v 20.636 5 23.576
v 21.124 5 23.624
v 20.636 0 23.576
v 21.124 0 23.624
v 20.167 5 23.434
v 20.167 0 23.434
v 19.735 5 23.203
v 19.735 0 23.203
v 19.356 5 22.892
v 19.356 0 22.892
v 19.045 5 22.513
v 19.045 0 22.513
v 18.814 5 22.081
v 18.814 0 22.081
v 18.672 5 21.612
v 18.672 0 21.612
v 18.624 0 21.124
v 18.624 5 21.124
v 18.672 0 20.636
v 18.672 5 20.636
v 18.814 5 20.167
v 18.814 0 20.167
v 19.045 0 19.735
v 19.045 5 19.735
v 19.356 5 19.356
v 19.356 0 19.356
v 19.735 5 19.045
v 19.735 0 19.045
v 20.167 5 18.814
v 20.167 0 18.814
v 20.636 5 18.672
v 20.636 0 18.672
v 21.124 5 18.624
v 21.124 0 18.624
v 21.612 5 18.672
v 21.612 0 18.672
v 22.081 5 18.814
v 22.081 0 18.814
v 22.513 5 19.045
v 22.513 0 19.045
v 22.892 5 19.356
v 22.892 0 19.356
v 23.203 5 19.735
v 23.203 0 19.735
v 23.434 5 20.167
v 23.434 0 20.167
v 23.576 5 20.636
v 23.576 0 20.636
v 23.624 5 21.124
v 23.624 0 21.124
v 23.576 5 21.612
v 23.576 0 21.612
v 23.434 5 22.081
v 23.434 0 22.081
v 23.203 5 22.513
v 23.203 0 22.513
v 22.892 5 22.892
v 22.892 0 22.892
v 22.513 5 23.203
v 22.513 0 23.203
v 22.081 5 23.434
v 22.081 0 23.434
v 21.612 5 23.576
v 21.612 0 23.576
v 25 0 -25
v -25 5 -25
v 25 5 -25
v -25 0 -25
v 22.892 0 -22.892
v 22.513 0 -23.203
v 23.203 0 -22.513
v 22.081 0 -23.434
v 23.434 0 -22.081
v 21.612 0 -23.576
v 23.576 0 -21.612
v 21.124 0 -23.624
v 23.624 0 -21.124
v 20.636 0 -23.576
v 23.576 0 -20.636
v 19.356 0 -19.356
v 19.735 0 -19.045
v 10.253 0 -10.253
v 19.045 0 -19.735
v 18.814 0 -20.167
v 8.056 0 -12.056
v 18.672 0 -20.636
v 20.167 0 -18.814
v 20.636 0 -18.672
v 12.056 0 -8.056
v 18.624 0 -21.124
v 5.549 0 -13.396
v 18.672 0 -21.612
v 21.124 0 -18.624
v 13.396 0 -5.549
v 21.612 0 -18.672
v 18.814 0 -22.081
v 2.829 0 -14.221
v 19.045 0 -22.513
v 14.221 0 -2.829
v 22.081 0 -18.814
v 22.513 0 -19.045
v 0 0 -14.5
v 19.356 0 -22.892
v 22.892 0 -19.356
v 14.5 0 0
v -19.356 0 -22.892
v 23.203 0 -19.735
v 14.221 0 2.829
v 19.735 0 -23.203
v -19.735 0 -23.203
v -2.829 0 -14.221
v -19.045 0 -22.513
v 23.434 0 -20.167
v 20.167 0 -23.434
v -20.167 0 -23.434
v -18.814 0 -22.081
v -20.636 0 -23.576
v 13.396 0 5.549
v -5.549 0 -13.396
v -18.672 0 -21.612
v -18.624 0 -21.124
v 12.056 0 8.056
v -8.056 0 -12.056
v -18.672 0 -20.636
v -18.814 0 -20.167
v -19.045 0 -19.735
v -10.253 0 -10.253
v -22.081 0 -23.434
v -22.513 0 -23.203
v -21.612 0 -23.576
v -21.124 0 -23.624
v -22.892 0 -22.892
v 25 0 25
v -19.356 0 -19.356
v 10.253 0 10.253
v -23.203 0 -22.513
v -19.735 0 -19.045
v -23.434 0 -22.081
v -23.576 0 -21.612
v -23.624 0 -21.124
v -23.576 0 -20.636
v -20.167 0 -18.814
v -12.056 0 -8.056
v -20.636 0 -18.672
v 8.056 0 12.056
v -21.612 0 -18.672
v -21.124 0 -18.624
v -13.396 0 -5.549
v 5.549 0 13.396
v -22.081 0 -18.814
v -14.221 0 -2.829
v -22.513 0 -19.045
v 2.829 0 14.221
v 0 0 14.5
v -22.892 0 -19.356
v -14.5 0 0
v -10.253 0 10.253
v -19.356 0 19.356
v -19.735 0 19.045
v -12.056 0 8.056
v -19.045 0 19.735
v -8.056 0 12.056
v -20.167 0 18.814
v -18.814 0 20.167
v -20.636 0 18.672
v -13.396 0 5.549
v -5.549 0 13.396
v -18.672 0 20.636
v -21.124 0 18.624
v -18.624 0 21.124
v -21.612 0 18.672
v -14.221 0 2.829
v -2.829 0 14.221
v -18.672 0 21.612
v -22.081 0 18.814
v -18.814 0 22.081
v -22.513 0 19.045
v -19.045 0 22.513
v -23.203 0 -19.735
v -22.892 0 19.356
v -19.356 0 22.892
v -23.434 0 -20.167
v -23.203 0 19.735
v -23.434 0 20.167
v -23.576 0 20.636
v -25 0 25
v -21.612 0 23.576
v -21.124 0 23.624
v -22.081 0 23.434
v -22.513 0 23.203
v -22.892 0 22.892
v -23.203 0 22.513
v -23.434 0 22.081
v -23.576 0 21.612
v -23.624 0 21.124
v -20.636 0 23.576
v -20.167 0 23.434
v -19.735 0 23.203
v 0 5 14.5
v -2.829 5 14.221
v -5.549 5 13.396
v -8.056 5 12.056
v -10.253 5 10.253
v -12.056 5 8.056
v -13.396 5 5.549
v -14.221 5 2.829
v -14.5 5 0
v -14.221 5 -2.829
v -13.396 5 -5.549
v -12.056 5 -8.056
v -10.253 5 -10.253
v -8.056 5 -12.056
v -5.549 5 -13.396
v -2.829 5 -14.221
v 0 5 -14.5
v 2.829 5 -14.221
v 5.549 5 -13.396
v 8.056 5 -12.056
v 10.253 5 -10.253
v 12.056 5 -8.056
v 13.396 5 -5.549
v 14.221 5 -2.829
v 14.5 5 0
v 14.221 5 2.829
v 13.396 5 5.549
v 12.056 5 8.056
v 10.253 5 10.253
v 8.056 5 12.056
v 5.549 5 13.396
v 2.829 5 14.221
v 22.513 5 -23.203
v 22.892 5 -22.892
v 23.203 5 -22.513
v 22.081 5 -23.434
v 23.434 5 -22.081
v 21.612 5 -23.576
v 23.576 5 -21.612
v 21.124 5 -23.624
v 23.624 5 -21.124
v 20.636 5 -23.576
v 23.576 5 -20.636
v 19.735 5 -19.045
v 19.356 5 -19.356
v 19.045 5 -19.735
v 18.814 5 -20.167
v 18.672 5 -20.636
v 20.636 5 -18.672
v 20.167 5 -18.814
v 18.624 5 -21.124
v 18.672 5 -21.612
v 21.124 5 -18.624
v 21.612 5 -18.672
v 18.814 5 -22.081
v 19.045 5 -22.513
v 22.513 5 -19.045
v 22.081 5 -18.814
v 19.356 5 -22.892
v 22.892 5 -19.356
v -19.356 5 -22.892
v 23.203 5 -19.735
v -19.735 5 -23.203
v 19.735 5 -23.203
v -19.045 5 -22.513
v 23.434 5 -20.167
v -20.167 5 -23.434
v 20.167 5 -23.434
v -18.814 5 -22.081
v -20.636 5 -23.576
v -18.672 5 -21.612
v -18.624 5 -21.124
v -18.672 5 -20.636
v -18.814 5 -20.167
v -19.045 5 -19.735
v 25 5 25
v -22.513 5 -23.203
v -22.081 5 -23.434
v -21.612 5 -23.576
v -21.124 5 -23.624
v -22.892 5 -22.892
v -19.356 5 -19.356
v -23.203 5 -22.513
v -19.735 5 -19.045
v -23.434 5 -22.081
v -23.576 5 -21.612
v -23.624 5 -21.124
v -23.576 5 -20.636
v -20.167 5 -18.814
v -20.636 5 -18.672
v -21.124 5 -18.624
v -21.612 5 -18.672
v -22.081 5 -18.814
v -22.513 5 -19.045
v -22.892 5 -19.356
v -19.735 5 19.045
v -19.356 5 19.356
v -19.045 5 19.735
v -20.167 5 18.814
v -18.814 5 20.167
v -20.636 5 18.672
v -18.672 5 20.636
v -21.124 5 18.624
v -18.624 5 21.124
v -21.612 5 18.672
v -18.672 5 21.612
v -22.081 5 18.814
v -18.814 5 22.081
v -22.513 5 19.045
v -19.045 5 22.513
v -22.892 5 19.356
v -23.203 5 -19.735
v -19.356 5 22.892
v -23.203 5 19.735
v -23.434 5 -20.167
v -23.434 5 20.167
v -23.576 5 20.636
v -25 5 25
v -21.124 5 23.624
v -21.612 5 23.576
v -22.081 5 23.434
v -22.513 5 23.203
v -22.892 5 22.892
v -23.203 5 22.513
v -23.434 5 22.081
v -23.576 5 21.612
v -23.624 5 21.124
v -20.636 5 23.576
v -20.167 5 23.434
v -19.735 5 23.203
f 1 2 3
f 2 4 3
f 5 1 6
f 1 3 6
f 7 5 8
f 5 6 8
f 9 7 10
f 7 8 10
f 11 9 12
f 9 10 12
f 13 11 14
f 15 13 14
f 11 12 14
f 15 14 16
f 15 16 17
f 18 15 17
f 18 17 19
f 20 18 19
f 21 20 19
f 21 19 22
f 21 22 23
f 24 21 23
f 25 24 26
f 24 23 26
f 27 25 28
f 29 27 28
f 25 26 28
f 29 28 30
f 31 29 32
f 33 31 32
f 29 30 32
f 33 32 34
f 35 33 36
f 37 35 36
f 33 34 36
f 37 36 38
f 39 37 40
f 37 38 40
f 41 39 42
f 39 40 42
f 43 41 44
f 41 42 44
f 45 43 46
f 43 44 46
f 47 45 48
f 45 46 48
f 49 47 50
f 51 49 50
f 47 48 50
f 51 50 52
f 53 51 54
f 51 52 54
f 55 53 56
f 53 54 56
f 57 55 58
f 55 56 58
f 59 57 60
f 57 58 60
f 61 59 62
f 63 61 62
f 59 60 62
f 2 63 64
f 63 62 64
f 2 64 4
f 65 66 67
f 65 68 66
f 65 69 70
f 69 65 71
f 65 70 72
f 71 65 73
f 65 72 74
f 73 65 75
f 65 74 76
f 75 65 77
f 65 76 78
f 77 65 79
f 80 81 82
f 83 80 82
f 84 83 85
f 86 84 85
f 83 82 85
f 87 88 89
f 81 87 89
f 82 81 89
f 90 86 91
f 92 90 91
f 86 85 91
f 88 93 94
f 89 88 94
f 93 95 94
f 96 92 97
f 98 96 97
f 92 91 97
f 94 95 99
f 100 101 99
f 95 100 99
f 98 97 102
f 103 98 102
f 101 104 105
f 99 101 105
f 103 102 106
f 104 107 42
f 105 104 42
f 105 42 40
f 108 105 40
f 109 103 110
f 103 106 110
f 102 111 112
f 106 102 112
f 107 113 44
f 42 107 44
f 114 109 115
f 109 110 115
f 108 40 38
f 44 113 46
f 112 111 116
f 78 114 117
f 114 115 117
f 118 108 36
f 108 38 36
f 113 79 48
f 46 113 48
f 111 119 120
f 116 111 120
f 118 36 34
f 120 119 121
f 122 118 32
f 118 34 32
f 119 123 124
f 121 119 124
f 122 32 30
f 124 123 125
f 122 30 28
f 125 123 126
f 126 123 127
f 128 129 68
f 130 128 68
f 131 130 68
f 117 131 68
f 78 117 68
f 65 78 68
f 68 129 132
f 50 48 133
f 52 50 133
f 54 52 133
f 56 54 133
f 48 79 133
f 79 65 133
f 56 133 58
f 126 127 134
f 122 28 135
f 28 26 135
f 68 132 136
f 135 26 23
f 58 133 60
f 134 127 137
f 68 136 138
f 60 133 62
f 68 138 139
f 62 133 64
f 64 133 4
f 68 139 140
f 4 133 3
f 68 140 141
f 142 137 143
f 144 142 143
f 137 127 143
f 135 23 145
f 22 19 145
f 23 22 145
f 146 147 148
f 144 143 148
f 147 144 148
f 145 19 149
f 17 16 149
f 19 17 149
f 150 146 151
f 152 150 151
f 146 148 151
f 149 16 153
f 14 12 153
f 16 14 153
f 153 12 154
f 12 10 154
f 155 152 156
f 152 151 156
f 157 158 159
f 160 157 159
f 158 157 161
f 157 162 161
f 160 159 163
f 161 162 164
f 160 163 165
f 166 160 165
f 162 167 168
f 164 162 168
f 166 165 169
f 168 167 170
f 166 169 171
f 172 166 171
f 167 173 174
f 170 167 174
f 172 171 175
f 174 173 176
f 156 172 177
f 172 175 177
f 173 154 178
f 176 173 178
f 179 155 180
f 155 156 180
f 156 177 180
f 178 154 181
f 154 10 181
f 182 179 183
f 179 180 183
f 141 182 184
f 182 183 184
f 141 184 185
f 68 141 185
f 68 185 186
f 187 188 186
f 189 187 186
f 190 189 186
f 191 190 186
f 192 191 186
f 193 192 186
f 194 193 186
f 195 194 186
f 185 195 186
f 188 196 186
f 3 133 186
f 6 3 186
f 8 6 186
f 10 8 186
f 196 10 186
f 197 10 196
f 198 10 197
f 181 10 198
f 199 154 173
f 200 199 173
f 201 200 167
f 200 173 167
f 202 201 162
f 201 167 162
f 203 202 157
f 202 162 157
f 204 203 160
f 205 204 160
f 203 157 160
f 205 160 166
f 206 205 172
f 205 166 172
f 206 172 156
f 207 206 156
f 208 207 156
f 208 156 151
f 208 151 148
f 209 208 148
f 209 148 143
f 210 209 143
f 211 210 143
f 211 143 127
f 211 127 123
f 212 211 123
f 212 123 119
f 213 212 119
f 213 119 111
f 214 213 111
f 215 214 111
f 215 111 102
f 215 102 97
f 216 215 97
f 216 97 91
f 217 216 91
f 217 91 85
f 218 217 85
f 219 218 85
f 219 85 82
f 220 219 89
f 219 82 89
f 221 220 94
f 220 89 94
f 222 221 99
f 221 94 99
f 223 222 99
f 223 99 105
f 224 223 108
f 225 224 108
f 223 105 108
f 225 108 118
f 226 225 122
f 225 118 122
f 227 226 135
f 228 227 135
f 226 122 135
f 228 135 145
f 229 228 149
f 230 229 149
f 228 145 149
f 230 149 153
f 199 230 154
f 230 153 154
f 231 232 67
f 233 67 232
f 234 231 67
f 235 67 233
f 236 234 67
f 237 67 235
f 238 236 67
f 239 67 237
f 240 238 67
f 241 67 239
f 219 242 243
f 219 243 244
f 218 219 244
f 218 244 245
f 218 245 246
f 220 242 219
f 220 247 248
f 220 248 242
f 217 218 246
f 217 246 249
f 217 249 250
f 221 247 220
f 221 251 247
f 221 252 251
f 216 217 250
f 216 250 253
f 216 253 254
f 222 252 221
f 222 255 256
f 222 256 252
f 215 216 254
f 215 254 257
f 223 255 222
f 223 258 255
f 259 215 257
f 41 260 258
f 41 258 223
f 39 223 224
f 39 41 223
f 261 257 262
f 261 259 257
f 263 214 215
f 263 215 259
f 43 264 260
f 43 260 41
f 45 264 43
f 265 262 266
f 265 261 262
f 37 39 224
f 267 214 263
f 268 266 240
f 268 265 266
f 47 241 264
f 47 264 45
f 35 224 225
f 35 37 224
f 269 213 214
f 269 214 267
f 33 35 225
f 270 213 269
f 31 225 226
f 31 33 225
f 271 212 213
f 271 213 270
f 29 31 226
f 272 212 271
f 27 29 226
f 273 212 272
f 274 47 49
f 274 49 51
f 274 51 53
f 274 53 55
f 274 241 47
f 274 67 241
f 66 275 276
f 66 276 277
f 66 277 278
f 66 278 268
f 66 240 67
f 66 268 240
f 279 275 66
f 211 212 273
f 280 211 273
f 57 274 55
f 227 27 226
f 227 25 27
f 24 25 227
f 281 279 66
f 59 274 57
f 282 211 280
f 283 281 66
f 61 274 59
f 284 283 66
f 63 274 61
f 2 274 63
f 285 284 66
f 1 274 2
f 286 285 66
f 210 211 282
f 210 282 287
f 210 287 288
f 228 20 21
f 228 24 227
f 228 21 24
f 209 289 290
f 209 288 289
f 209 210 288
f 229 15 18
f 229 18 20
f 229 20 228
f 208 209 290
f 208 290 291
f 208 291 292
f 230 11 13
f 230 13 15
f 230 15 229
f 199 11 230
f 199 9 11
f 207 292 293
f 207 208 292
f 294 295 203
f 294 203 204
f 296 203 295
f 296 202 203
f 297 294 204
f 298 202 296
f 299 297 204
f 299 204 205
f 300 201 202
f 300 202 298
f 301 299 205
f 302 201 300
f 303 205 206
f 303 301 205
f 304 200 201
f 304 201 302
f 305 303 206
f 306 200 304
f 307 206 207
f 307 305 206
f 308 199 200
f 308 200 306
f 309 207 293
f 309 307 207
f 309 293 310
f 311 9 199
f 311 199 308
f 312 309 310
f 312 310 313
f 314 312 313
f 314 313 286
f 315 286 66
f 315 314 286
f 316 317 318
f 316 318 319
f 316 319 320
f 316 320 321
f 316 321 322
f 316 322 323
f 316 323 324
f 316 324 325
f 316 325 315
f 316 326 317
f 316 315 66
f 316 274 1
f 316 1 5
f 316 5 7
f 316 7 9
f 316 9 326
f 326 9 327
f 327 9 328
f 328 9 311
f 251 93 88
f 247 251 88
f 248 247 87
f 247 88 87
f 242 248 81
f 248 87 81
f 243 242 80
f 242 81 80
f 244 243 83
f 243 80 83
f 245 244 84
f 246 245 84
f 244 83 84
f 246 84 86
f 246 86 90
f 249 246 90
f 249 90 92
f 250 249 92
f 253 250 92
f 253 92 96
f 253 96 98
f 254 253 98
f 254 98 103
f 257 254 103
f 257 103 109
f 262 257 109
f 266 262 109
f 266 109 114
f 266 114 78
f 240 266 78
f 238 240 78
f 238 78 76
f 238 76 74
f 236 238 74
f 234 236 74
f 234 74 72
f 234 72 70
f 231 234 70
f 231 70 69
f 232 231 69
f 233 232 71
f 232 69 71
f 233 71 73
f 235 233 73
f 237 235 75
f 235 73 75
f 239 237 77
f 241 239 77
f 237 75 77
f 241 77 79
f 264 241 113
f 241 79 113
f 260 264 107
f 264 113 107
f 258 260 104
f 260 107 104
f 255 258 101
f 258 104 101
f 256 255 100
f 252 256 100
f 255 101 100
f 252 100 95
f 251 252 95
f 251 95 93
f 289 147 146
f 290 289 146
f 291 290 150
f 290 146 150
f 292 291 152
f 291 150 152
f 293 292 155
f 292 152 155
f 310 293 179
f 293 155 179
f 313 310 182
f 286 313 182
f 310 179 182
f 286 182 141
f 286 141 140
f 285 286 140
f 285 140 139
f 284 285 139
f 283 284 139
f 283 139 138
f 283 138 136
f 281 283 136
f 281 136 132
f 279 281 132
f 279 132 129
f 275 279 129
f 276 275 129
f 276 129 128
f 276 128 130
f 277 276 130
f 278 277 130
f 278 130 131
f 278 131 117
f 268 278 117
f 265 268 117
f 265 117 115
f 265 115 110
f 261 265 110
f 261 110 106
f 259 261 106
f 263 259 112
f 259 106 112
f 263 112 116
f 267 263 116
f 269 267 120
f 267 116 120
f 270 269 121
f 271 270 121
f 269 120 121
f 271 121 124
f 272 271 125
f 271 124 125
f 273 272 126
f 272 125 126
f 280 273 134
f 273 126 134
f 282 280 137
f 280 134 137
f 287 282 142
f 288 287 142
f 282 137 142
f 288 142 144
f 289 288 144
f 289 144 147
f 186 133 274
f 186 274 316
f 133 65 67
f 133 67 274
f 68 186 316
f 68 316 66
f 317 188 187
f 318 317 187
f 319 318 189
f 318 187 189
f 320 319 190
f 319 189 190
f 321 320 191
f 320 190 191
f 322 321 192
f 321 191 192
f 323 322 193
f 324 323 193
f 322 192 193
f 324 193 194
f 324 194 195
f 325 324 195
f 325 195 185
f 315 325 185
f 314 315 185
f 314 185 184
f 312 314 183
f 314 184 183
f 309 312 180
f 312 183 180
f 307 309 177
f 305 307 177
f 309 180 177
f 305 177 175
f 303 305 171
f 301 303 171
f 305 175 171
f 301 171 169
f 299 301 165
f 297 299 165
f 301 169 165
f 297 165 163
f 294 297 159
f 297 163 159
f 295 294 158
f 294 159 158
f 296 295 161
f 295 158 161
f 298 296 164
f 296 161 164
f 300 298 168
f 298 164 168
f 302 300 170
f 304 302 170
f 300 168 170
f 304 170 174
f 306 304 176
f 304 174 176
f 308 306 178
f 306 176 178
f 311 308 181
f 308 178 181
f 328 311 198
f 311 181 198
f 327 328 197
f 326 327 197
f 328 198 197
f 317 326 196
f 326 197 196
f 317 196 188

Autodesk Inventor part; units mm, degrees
ref_plane "YZ Plane" through (0, 0, 0) normal (1, 0, 0) x (0, 1, 0)
ref_plane "XZ Plane" through (0, 0, 0) normal (0, 1, 0) x (-1, 0, 0)
ref_plane "XY Plane" through (0, 0, 0) normal (0, 0, 1) x (1, 0, 0)
sketch "Skizze1" plane through (0, 0, 0) normal (0, 1, 0) x (-1, 0, 0)
  line L0 (-25, 25) -> (25, 25)
  line L1 (25, 25) -> (25, -25)
  line L2 (25, -25) -> (-25, -25)
  line L3 (-25, -25) -> (-25, 25)
  line L4 (-25, 25) -> (25, -25) construction
  line L5 (25, 25) -> (-25, -25) construction
  point P0 (0, 0)
  dimension "d0" = 50
  dimension "d1" = 50
extrude "Extrusion1" add sketch "Skizze1" along normal blind 5
sketch "Skizze2" plane through (0, 5, 0) normal (0, 1, 0) x (1, 0, 0)
  point P0 (0, 0)
  point P1 (0, 0)
hole "Bohrung1" at (0, 5, 0) direction (0, -1, 0) diameter 29 depth 5
sketch "Skizze3" plane through (0, 5, 0) normal (0, 1, 0) x (1, 0, 0)
  line L0 (25, 25) -> (-25, 25) projected
  line L1 (0, 25) -> (0, -25) construction
  line L2 (-25, -25) -> (25, -25) projected
  line L3 (25, -25) -> (25, 25) projected
  line L4 (25, 0) -> (-25, 0) construction
  line L5 (-25, 25) -> (-25, -25) projected
  point P0 (0, 0)
  point P1 (-21.124, -21.124)
  point P2 (-21.124, 21.124)
  point P3 (21.124, -21.124)
  point P4 (21.124, 21.124)
  dimension "d18" = 42.248
  dimension "d19" = 42.248
hole "Bohrung2" at (-21.124, 5, 21.124) at (-21.124, 5, -21.124) at (21.124, 5, 21.124) at (21.124, 5, -21.124) direction (0, -1, 0) diameter 5 depth 5
equation "\"d18\" = d19"
properties part number "thickshield_cylinder"
